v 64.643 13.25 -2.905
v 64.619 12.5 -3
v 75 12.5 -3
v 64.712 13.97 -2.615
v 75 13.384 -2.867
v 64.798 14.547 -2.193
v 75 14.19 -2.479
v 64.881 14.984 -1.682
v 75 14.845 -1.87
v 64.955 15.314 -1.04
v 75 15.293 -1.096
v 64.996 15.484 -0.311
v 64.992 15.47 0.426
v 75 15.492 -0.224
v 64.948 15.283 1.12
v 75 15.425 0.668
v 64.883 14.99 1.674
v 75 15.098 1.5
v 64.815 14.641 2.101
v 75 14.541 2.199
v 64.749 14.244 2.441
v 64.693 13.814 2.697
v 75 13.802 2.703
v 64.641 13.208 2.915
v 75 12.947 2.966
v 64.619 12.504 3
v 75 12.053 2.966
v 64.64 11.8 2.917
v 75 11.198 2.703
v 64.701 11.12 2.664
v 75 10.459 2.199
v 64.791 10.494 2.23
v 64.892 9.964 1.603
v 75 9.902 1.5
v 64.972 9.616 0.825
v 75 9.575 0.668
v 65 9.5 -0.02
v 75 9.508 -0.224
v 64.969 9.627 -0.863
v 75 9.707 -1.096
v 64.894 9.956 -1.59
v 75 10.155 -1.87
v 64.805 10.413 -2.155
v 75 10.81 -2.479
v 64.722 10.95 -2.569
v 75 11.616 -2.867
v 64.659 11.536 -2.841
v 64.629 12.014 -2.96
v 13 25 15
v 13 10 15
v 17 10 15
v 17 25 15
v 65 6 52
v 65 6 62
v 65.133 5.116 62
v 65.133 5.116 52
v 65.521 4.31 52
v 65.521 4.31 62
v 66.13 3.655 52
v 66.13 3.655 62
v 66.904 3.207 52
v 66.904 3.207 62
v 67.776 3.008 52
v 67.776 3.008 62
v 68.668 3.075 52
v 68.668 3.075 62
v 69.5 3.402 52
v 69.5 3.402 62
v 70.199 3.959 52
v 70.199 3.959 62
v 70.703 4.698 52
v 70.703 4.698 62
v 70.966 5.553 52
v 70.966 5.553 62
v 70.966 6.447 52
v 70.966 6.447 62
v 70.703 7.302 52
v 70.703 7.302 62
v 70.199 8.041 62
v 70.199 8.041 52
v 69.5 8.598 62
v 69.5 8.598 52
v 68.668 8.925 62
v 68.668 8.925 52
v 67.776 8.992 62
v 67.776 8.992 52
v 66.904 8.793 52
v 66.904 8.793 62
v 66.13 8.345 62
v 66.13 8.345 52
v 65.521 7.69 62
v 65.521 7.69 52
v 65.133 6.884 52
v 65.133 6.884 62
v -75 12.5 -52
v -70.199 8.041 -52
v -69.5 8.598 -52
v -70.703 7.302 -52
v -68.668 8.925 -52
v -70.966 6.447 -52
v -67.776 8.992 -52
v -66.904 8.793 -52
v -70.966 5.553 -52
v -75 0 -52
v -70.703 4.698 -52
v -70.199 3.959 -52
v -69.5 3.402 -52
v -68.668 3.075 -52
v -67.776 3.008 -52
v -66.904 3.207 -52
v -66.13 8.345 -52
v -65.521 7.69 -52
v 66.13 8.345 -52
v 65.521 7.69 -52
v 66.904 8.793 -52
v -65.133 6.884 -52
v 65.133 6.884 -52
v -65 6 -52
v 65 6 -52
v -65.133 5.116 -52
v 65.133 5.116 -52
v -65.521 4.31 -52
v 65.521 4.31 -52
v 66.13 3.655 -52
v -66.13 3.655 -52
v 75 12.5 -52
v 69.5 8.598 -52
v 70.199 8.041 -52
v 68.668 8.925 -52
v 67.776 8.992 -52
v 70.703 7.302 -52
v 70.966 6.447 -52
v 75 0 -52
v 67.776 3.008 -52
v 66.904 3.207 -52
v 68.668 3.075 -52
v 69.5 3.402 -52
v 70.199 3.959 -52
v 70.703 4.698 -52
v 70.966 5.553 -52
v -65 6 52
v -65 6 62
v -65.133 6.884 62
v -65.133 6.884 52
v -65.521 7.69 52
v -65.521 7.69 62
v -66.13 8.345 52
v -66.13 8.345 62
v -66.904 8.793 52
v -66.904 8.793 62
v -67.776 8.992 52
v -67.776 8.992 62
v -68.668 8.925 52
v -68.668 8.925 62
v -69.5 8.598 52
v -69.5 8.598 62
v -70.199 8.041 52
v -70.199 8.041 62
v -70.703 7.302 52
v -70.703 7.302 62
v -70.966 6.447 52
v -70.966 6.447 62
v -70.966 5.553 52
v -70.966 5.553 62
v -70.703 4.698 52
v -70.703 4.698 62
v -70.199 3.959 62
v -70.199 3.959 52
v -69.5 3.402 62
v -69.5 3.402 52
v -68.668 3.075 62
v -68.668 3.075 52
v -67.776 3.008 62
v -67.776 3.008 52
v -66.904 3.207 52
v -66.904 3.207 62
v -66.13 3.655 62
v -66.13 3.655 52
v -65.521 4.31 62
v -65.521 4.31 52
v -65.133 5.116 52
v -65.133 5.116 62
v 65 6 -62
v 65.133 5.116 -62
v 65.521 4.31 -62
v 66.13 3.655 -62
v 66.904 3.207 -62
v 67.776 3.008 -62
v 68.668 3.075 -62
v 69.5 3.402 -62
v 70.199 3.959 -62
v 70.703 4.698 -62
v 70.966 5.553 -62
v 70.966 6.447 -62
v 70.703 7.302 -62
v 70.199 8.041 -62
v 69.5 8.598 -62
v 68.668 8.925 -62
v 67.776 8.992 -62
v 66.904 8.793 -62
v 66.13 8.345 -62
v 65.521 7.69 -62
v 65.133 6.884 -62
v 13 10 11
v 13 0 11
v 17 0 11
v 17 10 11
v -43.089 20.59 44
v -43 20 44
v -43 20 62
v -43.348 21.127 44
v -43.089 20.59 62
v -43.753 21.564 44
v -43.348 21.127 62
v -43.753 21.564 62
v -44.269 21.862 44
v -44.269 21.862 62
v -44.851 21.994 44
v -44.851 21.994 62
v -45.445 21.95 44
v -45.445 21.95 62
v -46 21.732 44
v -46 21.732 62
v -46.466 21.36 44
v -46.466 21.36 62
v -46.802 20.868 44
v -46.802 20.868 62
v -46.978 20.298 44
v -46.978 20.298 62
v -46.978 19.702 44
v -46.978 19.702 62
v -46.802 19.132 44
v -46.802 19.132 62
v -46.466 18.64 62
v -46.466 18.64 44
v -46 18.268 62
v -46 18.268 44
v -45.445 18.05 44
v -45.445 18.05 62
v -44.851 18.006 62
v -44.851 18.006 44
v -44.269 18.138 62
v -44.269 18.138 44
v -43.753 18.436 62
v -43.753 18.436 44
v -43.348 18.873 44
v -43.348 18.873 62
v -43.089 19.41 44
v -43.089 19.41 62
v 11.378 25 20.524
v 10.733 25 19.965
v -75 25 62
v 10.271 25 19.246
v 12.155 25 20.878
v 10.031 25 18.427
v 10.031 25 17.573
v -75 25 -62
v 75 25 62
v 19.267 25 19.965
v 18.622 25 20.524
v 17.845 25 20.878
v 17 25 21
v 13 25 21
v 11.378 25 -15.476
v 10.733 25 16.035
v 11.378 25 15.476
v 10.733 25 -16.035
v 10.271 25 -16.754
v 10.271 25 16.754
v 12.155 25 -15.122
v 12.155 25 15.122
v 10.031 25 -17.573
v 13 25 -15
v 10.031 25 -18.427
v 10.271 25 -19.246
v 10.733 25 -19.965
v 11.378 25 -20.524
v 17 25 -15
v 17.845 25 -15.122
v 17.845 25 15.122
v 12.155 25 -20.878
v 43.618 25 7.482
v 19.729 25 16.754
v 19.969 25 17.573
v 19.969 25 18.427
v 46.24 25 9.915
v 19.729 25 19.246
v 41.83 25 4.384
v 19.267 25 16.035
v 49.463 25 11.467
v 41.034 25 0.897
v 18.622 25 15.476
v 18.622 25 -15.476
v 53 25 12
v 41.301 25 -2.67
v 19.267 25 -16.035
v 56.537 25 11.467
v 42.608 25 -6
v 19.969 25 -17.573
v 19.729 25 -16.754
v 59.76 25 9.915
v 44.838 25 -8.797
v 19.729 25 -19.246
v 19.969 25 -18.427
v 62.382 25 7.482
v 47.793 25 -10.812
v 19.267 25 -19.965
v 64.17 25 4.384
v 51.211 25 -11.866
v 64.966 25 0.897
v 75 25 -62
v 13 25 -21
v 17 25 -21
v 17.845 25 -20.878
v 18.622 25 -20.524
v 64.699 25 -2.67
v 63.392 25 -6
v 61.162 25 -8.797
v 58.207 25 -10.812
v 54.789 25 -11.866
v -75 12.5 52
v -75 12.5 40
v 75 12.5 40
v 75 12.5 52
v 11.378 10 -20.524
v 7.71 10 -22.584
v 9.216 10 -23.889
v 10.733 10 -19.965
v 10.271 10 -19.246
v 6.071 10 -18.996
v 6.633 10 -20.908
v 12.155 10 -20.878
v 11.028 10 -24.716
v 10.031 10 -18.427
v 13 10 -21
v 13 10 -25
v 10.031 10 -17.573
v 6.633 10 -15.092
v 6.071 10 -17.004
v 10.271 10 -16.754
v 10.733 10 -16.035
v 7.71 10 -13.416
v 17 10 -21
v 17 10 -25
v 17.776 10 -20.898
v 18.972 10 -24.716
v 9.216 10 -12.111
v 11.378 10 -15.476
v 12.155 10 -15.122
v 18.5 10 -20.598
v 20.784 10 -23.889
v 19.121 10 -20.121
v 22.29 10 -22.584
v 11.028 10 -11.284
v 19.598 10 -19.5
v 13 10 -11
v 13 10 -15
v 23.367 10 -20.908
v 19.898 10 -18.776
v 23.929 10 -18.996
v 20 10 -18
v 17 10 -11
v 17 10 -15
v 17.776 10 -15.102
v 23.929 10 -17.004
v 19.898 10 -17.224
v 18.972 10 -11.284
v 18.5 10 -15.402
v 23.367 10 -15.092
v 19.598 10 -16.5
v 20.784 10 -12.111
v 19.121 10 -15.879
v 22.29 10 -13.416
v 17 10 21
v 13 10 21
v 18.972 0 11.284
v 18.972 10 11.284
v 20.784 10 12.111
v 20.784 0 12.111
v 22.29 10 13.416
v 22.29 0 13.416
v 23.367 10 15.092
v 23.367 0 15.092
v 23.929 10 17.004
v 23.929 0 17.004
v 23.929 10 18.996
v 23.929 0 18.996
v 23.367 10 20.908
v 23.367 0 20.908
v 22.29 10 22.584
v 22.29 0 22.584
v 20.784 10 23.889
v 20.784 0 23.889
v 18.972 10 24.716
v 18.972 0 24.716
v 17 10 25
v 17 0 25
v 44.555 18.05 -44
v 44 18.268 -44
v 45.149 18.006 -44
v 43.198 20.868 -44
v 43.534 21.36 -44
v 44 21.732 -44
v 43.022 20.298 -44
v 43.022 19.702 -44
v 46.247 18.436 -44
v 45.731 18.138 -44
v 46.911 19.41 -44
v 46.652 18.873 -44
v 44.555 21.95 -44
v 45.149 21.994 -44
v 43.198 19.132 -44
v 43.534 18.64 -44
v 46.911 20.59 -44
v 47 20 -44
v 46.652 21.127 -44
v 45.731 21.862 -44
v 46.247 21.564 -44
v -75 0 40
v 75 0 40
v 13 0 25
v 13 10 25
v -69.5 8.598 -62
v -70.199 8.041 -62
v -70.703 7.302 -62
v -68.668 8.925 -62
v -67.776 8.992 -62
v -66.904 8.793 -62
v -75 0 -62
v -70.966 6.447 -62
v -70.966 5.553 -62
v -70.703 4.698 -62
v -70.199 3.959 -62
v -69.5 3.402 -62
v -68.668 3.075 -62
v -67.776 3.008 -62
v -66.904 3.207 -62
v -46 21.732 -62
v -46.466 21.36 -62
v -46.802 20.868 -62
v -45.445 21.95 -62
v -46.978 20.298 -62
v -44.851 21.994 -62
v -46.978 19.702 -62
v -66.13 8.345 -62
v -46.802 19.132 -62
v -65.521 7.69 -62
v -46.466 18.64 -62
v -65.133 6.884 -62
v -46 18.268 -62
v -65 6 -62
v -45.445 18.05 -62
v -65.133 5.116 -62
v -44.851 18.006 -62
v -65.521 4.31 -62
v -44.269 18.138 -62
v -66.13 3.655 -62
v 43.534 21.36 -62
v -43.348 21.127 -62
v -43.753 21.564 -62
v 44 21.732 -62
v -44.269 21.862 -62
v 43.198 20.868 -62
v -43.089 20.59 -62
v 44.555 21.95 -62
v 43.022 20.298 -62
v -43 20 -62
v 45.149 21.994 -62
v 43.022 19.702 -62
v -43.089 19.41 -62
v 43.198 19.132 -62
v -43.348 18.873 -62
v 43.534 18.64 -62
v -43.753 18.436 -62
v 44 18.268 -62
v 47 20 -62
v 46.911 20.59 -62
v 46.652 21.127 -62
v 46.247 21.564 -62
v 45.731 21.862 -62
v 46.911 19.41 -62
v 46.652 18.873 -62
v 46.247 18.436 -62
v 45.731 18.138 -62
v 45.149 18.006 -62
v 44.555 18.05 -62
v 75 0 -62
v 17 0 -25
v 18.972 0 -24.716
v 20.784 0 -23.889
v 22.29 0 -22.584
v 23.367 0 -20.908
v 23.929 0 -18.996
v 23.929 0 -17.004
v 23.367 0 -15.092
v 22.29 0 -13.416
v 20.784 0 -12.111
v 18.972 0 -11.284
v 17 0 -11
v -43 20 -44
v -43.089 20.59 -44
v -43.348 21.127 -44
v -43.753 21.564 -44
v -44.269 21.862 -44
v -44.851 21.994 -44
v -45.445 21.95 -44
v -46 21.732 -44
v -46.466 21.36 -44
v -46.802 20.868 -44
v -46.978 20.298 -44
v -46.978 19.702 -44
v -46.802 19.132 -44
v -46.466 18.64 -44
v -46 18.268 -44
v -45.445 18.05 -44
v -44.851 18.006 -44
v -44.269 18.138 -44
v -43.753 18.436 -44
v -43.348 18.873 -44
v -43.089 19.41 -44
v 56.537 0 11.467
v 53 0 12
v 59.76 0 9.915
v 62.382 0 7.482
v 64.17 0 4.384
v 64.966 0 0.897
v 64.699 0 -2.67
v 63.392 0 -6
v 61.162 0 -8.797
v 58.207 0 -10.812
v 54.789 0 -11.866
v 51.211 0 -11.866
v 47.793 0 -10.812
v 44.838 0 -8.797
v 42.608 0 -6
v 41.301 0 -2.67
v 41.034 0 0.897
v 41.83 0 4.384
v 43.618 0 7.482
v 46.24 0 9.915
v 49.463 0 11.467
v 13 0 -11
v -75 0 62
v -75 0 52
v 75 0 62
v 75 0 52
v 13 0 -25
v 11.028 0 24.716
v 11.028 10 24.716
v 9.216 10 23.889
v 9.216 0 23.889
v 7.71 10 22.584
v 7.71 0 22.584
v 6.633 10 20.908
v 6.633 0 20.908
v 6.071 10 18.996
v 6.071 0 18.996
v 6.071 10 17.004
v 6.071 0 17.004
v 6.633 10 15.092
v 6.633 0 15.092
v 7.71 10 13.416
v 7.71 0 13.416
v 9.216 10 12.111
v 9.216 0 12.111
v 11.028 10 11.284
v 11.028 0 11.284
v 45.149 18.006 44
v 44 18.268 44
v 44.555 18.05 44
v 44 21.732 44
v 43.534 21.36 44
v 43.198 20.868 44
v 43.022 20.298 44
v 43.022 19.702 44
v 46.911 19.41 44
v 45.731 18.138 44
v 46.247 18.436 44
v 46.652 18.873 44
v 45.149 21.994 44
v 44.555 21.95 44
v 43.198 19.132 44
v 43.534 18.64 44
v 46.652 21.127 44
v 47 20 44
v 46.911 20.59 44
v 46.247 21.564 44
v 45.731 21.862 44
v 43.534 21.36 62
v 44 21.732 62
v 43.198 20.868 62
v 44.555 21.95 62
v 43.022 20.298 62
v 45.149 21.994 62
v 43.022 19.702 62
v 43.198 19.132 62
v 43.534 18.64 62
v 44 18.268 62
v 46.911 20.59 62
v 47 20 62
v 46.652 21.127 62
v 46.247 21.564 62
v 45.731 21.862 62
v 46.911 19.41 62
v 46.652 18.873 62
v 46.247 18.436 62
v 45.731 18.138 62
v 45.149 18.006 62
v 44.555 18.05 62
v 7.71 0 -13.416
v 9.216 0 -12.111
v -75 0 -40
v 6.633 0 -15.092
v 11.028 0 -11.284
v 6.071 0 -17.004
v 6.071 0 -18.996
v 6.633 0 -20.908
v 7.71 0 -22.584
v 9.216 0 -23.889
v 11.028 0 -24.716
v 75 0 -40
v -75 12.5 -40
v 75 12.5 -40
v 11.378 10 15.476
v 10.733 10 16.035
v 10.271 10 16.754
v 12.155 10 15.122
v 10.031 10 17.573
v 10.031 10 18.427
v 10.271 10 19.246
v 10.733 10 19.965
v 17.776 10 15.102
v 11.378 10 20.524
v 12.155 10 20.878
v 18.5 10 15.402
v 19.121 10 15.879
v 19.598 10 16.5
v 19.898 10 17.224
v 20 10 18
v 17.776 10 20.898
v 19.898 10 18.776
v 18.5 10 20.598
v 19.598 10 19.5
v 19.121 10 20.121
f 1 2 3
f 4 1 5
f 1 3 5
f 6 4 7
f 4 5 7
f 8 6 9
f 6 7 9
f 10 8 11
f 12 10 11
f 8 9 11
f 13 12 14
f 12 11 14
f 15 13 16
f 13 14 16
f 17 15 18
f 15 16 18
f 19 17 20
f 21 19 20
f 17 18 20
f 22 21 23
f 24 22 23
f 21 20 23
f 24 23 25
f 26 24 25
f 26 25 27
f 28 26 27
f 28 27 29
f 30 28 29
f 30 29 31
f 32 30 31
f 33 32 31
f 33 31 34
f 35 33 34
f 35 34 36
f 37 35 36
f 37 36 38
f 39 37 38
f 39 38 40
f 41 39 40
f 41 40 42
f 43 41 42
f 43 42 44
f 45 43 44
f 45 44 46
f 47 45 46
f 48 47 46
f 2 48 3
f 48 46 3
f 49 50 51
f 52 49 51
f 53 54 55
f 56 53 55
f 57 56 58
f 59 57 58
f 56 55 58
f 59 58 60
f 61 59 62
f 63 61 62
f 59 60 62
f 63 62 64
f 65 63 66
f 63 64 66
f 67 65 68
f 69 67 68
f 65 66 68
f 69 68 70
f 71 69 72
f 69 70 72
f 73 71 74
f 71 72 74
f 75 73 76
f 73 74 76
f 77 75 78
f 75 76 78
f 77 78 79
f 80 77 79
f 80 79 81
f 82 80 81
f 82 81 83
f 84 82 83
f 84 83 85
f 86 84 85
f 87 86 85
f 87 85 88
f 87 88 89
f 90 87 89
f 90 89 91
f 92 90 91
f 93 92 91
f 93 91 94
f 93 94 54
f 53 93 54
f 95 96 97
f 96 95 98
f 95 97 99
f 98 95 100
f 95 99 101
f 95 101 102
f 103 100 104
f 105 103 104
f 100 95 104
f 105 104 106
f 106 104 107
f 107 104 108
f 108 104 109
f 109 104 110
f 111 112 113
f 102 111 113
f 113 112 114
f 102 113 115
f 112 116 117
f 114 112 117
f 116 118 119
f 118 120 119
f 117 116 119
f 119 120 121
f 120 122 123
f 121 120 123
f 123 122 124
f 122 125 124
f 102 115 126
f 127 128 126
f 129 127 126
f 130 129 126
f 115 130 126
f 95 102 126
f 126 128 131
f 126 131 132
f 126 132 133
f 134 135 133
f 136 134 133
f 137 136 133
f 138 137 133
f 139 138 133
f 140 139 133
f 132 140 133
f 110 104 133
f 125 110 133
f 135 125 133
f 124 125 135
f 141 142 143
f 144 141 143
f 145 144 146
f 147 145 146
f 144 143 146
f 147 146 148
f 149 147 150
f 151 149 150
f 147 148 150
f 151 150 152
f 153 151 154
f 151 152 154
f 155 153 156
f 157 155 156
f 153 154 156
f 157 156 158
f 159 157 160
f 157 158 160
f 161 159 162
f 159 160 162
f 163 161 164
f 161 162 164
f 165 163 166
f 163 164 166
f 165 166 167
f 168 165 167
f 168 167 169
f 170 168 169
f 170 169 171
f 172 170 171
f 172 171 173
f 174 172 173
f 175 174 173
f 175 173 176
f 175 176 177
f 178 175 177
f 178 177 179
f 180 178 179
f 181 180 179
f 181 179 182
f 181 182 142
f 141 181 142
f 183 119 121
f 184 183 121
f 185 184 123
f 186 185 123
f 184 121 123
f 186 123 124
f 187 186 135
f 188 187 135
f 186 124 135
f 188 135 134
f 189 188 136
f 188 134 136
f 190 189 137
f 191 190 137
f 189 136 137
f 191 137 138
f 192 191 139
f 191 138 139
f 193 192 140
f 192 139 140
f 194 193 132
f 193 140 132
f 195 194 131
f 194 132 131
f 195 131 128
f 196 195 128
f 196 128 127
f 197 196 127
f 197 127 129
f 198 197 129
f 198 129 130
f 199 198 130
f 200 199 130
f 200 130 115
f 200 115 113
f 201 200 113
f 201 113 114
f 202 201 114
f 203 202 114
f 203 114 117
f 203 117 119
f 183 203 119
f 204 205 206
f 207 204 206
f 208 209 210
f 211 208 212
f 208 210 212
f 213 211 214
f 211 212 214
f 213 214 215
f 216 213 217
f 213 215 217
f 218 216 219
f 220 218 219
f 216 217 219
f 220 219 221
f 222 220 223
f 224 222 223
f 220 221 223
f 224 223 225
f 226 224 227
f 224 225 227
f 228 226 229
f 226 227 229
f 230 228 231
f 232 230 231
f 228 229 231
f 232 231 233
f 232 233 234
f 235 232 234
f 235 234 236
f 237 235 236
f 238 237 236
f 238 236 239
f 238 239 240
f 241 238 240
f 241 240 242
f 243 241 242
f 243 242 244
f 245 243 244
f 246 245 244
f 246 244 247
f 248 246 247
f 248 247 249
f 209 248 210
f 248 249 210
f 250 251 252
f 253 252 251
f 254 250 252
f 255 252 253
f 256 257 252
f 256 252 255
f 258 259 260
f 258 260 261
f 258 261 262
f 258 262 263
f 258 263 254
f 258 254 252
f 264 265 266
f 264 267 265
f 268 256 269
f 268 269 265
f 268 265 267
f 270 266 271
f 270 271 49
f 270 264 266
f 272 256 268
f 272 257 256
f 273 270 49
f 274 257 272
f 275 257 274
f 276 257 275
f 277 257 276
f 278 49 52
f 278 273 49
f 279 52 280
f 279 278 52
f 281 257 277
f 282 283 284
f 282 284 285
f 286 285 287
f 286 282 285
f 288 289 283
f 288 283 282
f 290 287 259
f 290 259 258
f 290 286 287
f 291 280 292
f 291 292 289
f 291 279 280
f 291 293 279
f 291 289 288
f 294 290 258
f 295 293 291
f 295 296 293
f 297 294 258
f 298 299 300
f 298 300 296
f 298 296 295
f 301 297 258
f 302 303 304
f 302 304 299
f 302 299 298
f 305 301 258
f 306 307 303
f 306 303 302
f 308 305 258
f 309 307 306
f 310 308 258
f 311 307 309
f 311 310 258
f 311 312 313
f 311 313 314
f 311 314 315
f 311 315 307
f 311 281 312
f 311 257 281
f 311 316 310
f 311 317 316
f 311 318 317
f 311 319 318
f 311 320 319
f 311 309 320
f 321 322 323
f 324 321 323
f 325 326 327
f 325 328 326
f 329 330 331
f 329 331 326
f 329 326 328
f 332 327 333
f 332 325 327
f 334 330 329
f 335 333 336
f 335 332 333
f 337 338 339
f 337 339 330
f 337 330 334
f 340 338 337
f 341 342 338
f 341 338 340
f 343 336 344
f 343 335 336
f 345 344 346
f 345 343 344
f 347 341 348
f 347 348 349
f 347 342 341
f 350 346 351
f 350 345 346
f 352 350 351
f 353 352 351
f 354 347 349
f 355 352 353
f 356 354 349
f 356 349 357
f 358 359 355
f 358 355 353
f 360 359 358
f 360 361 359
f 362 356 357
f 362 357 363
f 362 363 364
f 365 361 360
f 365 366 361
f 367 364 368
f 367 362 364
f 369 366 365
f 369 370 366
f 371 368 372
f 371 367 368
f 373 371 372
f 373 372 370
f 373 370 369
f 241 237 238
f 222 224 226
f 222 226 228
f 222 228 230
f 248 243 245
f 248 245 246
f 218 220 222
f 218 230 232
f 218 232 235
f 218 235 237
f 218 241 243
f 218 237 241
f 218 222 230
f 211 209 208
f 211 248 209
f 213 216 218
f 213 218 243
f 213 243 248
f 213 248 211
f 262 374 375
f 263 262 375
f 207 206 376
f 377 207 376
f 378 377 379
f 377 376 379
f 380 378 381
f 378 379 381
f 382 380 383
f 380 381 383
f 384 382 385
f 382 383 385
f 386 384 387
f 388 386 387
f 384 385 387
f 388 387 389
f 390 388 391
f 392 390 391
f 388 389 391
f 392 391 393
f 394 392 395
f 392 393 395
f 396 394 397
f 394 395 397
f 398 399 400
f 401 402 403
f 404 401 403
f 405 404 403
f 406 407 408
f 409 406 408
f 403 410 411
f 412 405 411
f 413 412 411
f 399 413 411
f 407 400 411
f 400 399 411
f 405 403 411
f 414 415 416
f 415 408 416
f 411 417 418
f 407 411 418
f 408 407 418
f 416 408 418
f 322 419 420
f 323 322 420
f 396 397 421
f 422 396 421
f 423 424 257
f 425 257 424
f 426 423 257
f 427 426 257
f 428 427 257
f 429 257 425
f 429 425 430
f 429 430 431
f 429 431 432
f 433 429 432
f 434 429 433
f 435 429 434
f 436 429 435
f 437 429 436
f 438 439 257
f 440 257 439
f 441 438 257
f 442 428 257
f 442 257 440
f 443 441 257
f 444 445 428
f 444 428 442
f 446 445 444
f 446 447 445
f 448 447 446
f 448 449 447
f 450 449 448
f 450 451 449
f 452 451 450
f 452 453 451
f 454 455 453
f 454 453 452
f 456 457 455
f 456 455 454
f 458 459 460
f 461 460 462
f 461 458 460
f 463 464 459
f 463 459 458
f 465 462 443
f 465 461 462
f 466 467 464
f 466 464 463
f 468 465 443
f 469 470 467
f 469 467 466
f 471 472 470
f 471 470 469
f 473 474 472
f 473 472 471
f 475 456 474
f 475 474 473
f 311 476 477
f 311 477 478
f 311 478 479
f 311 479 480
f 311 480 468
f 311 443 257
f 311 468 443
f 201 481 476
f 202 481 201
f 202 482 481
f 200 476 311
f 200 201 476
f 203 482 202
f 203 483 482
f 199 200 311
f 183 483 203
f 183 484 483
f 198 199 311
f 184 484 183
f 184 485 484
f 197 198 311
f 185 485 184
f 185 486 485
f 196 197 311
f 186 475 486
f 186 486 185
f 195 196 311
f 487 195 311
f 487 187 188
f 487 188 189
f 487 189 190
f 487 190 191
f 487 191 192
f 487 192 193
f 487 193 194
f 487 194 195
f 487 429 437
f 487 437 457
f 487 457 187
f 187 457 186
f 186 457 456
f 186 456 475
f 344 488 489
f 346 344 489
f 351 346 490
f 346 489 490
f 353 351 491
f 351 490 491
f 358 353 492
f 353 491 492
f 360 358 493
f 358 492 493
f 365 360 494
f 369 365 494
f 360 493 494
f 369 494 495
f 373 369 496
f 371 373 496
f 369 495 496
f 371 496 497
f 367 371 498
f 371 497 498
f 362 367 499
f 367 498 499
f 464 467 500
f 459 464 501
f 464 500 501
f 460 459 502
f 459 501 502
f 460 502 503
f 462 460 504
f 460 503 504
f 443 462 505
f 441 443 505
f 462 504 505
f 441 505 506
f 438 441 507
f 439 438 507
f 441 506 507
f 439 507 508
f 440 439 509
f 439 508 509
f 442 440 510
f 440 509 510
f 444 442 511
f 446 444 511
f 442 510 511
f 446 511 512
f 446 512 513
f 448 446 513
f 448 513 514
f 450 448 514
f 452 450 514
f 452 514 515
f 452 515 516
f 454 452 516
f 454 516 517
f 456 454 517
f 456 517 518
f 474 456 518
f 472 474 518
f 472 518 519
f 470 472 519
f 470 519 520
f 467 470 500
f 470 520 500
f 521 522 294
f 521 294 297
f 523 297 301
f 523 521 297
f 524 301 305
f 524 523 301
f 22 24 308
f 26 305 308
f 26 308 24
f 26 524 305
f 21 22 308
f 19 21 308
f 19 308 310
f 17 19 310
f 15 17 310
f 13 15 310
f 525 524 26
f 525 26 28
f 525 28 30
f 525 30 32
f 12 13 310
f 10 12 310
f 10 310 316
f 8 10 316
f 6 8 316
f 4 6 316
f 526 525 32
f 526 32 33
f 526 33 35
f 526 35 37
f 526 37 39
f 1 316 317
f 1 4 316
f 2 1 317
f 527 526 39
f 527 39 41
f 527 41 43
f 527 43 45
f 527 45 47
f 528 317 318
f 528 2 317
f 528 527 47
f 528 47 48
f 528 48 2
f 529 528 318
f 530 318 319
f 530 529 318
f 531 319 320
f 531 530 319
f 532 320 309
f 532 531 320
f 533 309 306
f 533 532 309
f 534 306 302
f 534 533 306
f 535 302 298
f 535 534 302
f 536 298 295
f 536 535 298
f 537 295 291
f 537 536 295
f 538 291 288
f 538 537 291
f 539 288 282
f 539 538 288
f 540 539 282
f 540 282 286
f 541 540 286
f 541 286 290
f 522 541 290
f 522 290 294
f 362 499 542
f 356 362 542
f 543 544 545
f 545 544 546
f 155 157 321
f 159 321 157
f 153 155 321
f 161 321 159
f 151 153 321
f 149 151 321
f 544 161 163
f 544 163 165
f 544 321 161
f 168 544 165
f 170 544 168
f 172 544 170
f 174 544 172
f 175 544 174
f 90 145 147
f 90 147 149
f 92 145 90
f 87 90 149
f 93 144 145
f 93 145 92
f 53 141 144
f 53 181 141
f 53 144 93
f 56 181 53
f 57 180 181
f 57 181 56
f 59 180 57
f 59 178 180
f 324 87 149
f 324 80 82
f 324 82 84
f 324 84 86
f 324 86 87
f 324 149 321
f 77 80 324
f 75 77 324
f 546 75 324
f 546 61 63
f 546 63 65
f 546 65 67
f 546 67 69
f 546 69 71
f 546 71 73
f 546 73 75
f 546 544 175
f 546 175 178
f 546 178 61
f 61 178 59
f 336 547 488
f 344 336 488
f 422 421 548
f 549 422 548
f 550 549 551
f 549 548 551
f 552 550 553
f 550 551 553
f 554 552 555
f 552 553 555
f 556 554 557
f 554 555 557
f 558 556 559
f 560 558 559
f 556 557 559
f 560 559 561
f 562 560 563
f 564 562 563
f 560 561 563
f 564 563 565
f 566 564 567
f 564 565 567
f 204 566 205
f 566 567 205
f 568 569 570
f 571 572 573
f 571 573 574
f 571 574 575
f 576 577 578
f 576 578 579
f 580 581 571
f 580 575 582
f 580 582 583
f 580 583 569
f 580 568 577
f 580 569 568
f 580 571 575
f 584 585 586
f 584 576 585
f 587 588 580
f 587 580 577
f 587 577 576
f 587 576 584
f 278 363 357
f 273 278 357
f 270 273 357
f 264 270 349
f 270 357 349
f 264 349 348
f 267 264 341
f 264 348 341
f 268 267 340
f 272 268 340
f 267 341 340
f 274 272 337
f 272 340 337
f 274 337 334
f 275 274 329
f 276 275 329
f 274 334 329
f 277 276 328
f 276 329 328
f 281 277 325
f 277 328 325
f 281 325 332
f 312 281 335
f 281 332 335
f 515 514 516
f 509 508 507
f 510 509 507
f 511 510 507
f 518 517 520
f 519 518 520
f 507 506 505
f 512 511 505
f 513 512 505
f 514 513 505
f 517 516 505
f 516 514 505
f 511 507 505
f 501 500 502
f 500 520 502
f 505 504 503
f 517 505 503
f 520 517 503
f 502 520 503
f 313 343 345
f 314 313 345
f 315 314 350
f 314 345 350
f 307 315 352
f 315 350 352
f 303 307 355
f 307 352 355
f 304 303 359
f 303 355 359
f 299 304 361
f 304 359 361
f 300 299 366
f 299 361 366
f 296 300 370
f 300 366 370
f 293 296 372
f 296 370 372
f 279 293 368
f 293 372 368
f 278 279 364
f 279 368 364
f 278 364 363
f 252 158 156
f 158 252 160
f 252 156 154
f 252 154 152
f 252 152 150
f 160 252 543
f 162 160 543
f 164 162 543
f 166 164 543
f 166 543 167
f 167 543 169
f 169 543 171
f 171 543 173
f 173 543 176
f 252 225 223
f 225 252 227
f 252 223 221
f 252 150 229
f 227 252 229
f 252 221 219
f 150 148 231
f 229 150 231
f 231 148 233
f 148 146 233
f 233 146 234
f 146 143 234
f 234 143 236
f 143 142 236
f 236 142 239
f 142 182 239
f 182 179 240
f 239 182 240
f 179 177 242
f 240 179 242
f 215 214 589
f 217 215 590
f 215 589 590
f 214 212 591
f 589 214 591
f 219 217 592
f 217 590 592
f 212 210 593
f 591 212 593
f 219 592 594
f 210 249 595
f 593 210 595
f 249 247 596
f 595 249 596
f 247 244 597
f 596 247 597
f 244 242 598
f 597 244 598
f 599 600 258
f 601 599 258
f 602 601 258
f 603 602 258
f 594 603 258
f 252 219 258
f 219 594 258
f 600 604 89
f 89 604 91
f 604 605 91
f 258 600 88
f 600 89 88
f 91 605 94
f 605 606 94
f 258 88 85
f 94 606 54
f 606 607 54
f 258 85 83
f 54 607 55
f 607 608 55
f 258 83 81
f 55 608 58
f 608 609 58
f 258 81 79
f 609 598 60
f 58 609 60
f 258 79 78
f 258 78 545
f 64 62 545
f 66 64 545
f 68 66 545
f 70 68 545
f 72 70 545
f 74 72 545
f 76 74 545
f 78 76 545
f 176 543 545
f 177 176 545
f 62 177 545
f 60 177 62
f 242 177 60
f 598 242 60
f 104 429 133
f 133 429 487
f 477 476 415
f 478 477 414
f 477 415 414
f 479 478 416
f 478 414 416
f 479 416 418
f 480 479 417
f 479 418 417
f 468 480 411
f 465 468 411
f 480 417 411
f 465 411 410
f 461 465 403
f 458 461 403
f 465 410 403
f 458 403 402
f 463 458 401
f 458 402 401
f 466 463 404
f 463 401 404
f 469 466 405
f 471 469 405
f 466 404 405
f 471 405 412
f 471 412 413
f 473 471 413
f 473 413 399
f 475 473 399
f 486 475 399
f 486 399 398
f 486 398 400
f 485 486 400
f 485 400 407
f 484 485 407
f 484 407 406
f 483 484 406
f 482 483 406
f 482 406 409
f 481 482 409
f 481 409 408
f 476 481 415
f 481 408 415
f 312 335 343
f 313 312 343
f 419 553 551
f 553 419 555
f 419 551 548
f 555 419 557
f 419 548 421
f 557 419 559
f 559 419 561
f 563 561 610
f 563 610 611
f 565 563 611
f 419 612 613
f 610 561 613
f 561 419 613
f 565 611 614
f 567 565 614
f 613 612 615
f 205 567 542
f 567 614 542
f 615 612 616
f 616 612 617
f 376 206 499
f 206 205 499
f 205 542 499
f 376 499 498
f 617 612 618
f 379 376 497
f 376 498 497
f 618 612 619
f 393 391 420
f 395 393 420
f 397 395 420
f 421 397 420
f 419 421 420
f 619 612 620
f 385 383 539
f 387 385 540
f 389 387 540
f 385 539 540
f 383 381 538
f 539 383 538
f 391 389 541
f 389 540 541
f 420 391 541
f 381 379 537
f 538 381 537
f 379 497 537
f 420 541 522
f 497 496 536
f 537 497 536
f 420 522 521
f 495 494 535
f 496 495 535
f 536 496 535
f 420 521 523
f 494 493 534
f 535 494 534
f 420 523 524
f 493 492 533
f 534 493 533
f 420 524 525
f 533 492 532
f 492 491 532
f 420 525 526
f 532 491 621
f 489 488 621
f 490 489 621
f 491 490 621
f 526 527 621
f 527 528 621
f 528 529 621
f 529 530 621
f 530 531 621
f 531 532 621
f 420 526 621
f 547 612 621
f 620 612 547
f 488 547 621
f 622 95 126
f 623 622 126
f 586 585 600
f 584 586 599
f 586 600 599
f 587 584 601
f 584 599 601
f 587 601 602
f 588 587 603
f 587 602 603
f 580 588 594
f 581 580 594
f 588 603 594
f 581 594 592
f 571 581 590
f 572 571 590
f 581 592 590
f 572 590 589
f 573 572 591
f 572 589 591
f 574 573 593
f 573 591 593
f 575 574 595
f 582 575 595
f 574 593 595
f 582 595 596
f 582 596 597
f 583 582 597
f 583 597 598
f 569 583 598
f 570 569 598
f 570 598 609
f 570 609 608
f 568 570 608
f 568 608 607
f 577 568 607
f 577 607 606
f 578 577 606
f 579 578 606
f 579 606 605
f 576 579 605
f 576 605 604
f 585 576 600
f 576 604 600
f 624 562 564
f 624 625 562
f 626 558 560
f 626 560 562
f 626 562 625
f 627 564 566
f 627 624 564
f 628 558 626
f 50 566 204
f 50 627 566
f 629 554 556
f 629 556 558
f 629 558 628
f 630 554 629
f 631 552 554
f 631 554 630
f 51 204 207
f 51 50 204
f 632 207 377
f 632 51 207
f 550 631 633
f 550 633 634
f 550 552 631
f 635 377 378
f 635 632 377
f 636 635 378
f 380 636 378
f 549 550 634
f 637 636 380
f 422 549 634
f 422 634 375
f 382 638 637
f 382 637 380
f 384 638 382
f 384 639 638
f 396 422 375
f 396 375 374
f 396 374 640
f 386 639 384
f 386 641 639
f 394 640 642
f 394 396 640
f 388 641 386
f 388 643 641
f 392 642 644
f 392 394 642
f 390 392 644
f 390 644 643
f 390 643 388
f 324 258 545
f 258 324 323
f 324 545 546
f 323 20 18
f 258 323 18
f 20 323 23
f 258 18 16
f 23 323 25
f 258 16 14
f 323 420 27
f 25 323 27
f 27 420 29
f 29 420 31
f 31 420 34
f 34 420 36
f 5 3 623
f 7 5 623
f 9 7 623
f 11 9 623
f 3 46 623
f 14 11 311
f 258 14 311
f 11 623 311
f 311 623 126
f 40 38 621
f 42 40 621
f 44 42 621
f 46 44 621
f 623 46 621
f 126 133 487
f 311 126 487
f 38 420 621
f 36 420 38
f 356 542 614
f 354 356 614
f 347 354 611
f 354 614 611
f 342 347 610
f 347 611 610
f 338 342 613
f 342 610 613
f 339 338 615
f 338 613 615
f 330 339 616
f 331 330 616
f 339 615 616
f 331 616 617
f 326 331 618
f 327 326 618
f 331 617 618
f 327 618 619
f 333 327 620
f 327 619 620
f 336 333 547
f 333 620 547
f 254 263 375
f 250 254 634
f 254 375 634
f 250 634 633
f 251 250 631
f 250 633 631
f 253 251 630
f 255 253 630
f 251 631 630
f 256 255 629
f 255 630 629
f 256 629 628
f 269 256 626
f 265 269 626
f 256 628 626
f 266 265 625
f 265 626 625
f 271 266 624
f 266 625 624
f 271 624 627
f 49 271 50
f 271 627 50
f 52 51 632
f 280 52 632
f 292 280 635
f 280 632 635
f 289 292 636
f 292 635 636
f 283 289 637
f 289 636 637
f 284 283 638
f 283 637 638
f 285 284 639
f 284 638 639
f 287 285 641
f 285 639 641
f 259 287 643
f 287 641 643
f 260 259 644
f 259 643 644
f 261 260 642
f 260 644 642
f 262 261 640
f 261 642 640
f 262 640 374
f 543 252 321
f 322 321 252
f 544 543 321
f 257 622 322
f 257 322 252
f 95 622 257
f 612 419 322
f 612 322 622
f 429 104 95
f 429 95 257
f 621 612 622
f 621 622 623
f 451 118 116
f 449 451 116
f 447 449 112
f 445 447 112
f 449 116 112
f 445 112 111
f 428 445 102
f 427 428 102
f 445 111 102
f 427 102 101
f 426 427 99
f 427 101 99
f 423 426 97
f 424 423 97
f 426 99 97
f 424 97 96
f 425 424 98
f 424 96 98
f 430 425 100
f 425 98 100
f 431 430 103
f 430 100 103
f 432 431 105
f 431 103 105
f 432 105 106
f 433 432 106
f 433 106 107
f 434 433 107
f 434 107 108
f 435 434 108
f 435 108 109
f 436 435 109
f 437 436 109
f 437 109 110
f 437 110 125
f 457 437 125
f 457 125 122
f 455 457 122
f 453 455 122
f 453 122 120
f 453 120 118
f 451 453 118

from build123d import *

# Parameters (mm, degrees)
SKETCH1_W             = 150
SKETCH1_H             = 10
BOSS_EXTRUDE1_DEPTH   = 12.5
SKETCH1_H_2           = 80
SKETCH1_R             = 12
BOSS_EXTRUDE1_2_DEPTH = 12.5
BOSS_EXTRUDE1_3_DEPTH = 12.5
BOSS_EXTRUDE2_START   = 12.5
SKETCH1_3_W           = 150
SKETCH1_3_H           = 124
SKETCH1_3_R           = 12
BOSS_EXTRUDE2_DEPTH   = 12.5
SKETCH2_R             = 3
CUT_EXTRUDE1_DEPTH    = 101.468900661
CUT_EXTRUDE2_DEPTH    = 10
SKETCH3_R             = 3
CUT_EXTRUDE3_DEPTH    = 15
SKETCH4_R             = 2
SKETCH4_R_2           = 3
CUT_EXTRUDE4_DEPTH    = 18
CUT_EXTRUDE5_START    = -106
SKETCH4_2_R           = 2
SKETCH4_2_R_2         = 3
CUT_EXTRUDE5_DEPTH    = 18


with BuildPart() as part:
    # Sketch1 → Boss-Extrude1 (new body)
    with BuildSketch(Plane(origin=(0, 0, 0), x_dir=(1, 0, 0), z_dir=(0, 1, 0))):
        with Locations((0, 57)):
            Rectangle(SKETCH1_W, SKETCH1_H)
    extrude(amount=BOSS_EXTRUDE1_DEPTH)



with BuildPart() as body_2:
    # Sketch1 → Boss-Extrude1 2 (new body)
    with BuildSketch(Plane(origin=(0, 0, 0), x_dir=(1, 0, 0), z_dir=(0, 1, 0))):
        Rectangle(SKETCH1_W, SKETCH1_H_2)
        with Locations(Location((53, 0, 0), (0, 0, 270))):
            Circle(SKETCH1_R, mode=Mode.SUBTRACT)
    extrude(amount=BOSS_EXTRUDE1_2_DEPTH)


with BuildPart() as body_3:
    # Sketch1 → Boss-Extrude1 3 (new body)
    with BuildSketch(Plane(origin=(0, 0, 0), x_dir=(1, 0, 0), z_dir=(0, 1, 0))):
        with Locations((0, -57)):
            Rectangle(SKETCH1_W, SKETCH1_H)
    extrude(amount=BOSS_EXTRUDE1_3_DEPTH)


with BuildPart() as part_1:
    add(part.part)

    add(body_2.part)  # Boss-Extrude2 merges body 2

    add(body_3.part)  # Boss-Extrude2 merges body 3
    # Sketch1<3> → Boss-Extrude2 (add)
    with BuildSketch(Plane(origin=(0, 0, 0), x_dir=(1, 0, 0), z_dir=(0, 1, 0)).offset(BOSS_EXTRUDE2_START)):
        Rectangle(SKETCH1_3_W, SKETCH1_3_H)
        with Locations(Location((53, 0, 0), (0, 0, 270))):
            Circle(SKETCH1_3_R, mode=Mode.SUBTRACT)
    extrude(amount=BOSS_EXTRUDE2_DEPTH)

    # Sketch2 → Cut-Extrude1 (cut, through all)
    with BuildSketch(Plane.XZ):
        with Locations((13, -18)):
            Circle(SKETCH2_R)
        with Locations((17, -18)):
            Circle(SKETCH2_R)
        with BuildLine():
            Line((17, -15), (13, -15))
            ThreePointArc((13, -15), (14.070466269, -15.197482923), (15, -15.763932023))
            ThreePointArc((15, -15.763932023), (15.929533731, -15.197482923), (17, -15))
        make_face()
        with BuildLine():
            ThreePointArc((15, -20.236067977), (14.070466269, -20.802517077), (13, -21))
            Line((13, -21), (17, -21))
            ThreePointArc((17, -21), (15.929533731, -20.802517077), (15, -20.236067977))
        make_face()
        with Locations((17, 18)):
            Circle(SKETCH2_R)
        with Locations((13, 18)):
            Circle(SKETCH2_R)
        with BuildLine():
            Line((17, 21), (13, 21))
            ThreePointArc((13, 21), (14.070466269, 20.802517077), (15, 20.236067977))
            ThreePointArc((15, 20.236067977), (15.929533731, 20.802517077), (17, 21))
        make_face()
        with BuildLine():
            ThreePointArc((15, 15.763932023), (14.070466269, 15.197482923), (13, 15))
            Line((13, 15), (17, 15))
            ThreePointArc((17, 15), (15.929533731, 15.197482923), (15, 15.763932023))
        make_face()
    extrude(amount=-CUT_EXTRUDE1_DEPTH, mode=Mode.SUBTRACT)

    # Sketch2<3> → Cut-Extrude2 (cut)
    # profile 1 of 2: a face of its own
    with BuildSketch(Plane.XZ):
        with BuildLine():
            Line((17, 25), (13, 25))
            ThreePointArc((13, 25), (6, 18), (13, 11))
            Line((13, 11), (17, 11))
            ThreePointArc((17, 11), (24, 18), (17, 25))
        make_face()
        with BuildLine():
            ThreePointArc((13, 15), (10, 18), (13, 21))
            Line((13, 21), (17, 21))
            ThreePointArc((17, 21), (19.121320344, 20.121320344), (20, 18))
            ThreePointArc((20, 18), (19.121320344, 15.878679656), (17, 15))
            Line((17, 15), (13, 15))
        make_face(mode=Mode.SUBTRACT)
    # profile 2 of 2: a face of its own
    with BuildSketch(Plane.XZ):
        with BuildLine():
            Line((17, -11), (13, -11))
            ThreePointArc((13, -11), (6, -18), (13, -25))
            Line((13, -25), (17, -25))
            ThreePointArc((17, -25), (24, -18), (17, -11))
        make_face()
        with BuildLine():
            ThreePointArc((13, -21), (10, -18), (13, -15))
            Line((13, -15), (17, -15))
            ThreePointArc((17, -15), (19.121320344, -15.878679656), (20, -18))
            ThreePointArc((20, -18), (19.121320344, -20.121320344), (17, -21))
            Line((17, -21), (13, -21))
        make_face(mode=Mode.SUBTRACT)
    extrude(amount=-CUT_EXTRUDE2_DEPTH, mode=Mode.SUBTRACT)

    # Sketch3 → Cut-Extrude3 (cut)
    with BuildSketch(Plane(origin=(75, 0, 0), x_dir=(0, 0, -1), z_dir=(1, 0, 0))):
        with Locations((0, 12.5)):
            Circle(SKETCH3_R)
    extrude(amount=-CUT_EXTRUDE3_DEPTH, mode=Mode.SUBTRACT)

    # Sketch4 → Cut-Extrude4 (cut)
    with BuildSketch(Plane.XY.offset(62)):
        with Locations((-45, 20)):
            Circle(SKETCH4_R)
        with Locations((45, 20)):
            Circle(SKETCH4_R)
        with Locations((-68, 6)):
            Circle(SKETCH4_R_2)
        with Locations(Location((68, 6, 0), (0, 0, 180))):
            Circle(SKETCH4_R_2)
    extrude(amount=-CUT_EXTRUDE4_DEPTH, mode=Mode.SUBTRACT)

    # Sketch4<2> → Cut-Extrude5 (cut)
    with BuildSketch(Plane.XY.offset(62).offset(CUT_EXTRUDE5_START)):
        with Locations((-45, 20)):
            Circle(SKETCH4_2_R)
        with Locations((45, 20)):
            Circle(SKETCH4_2_R)
        with Locations((-68, 6)):
            Circle(SKETCH4_2_R_2)
        with Locations(Location((68, 6, 0), (0, 0, 180))):
            Circle(SKETCH4_2_R_2)
    extrude(amount=-CUT_EXTRUDE5_DEPTH, mode=Mode.SUBTRACT)


solid = part_1.part
